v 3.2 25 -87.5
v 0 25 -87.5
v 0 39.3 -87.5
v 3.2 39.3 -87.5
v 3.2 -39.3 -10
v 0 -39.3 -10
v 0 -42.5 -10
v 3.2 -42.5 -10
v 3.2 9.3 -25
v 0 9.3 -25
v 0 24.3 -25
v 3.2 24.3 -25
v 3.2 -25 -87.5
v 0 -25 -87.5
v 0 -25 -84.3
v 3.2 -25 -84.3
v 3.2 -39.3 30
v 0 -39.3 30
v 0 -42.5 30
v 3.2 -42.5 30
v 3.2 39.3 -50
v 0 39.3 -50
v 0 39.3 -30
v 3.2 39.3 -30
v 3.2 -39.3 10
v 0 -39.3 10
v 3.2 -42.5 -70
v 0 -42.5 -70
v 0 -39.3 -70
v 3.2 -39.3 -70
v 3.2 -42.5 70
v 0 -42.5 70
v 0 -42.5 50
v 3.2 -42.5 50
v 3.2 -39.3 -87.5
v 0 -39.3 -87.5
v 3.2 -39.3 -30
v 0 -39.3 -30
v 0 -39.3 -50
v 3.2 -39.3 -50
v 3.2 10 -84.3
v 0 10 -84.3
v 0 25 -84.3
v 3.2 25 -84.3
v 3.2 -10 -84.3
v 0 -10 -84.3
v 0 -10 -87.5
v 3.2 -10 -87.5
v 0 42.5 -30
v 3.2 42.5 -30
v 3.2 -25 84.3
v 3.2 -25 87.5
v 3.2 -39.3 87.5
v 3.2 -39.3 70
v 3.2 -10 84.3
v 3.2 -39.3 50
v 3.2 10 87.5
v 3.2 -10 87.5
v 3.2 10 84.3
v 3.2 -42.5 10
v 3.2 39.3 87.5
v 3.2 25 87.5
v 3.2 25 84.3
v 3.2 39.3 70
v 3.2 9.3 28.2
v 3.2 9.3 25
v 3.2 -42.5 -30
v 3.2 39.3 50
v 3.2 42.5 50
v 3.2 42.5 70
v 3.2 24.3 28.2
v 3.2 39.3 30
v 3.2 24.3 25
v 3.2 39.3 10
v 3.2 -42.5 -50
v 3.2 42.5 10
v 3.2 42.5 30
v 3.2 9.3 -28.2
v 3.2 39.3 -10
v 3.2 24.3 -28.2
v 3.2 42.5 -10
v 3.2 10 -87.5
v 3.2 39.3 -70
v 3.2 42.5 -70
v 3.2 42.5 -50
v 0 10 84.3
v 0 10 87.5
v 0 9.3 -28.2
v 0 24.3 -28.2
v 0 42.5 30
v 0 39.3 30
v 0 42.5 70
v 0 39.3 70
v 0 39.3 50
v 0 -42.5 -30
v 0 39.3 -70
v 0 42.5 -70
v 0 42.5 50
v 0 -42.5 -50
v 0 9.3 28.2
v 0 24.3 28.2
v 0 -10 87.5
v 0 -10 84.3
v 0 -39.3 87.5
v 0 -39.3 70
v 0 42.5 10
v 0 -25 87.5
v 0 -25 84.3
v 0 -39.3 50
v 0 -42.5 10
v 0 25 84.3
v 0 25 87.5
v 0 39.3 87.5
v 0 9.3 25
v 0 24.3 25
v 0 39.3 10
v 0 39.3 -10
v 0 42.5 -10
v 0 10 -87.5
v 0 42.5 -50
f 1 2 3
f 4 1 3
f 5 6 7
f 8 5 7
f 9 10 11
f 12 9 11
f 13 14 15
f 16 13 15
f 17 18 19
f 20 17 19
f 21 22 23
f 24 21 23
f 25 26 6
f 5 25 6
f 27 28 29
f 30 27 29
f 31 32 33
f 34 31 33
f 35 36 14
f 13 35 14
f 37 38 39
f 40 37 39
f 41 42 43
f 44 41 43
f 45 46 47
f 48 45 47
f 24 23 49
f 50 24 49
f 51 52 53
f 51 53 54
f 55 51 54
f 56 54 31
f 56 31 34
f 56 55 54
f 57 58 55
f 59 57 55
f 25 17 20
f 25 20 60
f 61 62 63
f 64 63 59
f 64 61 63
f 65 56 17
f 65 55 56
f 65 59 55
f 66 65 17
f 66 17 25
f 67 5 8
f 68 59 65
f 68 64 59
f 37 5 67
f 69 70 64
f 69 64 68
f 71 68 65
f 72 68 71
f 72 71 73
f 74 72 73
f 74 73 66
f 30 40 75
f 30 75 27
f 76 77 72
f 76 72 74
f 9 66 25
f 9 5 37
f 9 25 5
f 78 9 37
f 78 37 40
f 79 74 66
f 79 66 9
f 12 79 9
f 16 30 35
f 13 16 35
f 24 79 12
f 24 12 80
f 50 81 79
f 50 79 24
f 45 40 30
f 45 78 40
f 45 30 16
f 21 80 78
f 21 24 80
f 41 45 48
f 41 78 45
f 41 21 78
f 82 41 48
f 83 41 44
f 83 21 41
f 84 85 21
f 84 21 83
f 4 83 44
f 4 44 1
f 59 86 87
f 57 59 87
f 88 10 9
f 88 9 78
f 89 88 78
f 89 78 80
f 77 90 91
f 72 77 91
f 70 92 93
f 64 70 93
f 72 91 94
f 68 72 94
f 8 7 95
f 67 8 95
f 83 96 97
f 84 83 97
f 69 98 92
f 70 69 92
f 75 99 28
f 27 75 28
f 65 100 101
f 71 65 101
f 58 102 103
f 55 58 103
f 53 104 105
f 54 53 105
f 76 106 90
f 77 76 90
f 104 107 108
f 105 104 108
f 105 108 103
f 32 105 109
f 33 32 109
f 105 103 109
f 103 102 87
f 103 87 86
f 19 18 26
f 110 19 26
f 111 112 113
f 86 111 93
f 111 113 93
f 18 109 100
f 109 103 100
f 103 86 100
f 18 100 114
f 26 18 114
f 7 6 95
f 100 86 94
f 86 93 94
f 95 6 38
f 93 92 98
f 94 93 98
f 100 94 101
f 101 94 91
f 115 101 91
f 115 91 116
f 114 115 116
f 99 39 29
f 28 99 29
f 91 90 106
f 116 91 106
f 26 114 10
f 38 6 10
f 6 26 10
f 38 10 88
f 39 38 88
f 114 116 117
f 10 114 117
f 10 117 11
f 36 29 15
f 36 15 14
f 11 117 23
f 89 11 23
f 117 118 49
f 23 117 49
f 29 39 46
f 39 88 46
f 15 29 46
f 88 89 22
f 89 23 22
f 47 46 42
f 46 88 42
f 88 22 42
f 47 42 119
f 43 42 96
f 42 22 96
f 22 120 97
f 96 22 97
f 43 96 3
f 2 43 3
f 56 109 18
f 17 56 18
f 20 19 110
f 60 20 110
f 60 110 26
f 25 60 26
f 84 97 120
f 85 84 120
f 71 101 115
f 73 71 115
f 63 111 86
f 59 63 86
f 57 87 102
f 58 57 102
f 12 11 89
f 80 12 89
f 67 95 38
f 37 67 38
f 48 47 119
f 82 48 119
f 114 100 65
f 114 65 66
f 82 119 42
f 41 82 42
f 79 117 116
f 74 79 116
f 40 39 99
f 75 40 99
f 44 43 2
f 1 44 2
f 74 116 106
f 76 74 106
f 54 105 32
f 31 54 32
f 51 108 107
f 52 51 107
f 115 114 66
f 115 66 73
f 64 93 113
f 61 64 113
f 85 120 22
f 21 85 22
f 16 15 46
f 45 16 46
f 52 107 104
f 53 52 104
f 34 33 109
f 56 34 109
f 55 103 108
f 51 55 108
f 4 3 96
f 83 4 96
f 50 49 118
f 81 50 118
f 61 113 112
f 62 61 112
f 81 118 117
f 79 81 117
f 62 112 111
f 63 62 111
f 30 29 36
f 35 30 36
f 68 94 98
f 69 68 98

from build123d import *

# Parameters (mm, degrees)
SKETCH1_W           = 3.2
SKETCH1_H           = 15
BOSS_EXTRUDE1_DEPTH = 3.2


with BuildPart() as part:
    # Sketch1 → Boss-Extrude1 (new body)
    with BuildSketch(Plane(origin=(0, 0, 0), x_dir=(0, 0, -1), z_dir=(1, 0, 0))):
        Polygon((-10, 42.5), (-30, 42.5), (-30, 39.3), (-50, 39.3), (-50, 42.5), (-70, 42.5), (-70, 39.3), (-87.5, 39.3), (-87.5, 25), (-84.3, 25), (-84.3, 10), (-87.5, 10), (-87.5, -10), (-84.3, -10), (-84.3, -25), (-87.5, -25), (-87.5, -39.3), (-70, -39.3), (-70, -42.5), (-50, -42.5), (-50, -39.3), (-30, -39.3), (-30, -42.5), (-10, -42.5), (-10, -39.3), (10, -39.3), (10, -42.5), (30, -42.5), (30, -39.3), (50, -39.3), (50, -42.5), (70, -42.5), (70, -39.3), (87.5, -39.3), (87.5, -25), (84.3, -25), (84.3, -10), (87.5, -10), (87.5, 10), (84.3, 10), (84.3, 25), (87.5, 25), (87.5, 39.3), (70, 39.3), (70, 42.5), (50, 42.5), (50, 39.3), (30, 39.3), (30, 42.5), (10, 42.5), (10, 39.3), (-10, 39.3), align=None)
        with Locations((-26.6, 16.8)):
            Rectangle(SKETCH1_W, SKETCH1_H, mode=Mode.SUBTRACT)
        with Locations((26.6, 16.8)):
            Rectangle(SKETCH1_W, SKETCH1_H, mode=Mode.SUBTRACT)
    extrude(amount=BOSS_EXTRUDE1_DEPTH)


solid = part.part
